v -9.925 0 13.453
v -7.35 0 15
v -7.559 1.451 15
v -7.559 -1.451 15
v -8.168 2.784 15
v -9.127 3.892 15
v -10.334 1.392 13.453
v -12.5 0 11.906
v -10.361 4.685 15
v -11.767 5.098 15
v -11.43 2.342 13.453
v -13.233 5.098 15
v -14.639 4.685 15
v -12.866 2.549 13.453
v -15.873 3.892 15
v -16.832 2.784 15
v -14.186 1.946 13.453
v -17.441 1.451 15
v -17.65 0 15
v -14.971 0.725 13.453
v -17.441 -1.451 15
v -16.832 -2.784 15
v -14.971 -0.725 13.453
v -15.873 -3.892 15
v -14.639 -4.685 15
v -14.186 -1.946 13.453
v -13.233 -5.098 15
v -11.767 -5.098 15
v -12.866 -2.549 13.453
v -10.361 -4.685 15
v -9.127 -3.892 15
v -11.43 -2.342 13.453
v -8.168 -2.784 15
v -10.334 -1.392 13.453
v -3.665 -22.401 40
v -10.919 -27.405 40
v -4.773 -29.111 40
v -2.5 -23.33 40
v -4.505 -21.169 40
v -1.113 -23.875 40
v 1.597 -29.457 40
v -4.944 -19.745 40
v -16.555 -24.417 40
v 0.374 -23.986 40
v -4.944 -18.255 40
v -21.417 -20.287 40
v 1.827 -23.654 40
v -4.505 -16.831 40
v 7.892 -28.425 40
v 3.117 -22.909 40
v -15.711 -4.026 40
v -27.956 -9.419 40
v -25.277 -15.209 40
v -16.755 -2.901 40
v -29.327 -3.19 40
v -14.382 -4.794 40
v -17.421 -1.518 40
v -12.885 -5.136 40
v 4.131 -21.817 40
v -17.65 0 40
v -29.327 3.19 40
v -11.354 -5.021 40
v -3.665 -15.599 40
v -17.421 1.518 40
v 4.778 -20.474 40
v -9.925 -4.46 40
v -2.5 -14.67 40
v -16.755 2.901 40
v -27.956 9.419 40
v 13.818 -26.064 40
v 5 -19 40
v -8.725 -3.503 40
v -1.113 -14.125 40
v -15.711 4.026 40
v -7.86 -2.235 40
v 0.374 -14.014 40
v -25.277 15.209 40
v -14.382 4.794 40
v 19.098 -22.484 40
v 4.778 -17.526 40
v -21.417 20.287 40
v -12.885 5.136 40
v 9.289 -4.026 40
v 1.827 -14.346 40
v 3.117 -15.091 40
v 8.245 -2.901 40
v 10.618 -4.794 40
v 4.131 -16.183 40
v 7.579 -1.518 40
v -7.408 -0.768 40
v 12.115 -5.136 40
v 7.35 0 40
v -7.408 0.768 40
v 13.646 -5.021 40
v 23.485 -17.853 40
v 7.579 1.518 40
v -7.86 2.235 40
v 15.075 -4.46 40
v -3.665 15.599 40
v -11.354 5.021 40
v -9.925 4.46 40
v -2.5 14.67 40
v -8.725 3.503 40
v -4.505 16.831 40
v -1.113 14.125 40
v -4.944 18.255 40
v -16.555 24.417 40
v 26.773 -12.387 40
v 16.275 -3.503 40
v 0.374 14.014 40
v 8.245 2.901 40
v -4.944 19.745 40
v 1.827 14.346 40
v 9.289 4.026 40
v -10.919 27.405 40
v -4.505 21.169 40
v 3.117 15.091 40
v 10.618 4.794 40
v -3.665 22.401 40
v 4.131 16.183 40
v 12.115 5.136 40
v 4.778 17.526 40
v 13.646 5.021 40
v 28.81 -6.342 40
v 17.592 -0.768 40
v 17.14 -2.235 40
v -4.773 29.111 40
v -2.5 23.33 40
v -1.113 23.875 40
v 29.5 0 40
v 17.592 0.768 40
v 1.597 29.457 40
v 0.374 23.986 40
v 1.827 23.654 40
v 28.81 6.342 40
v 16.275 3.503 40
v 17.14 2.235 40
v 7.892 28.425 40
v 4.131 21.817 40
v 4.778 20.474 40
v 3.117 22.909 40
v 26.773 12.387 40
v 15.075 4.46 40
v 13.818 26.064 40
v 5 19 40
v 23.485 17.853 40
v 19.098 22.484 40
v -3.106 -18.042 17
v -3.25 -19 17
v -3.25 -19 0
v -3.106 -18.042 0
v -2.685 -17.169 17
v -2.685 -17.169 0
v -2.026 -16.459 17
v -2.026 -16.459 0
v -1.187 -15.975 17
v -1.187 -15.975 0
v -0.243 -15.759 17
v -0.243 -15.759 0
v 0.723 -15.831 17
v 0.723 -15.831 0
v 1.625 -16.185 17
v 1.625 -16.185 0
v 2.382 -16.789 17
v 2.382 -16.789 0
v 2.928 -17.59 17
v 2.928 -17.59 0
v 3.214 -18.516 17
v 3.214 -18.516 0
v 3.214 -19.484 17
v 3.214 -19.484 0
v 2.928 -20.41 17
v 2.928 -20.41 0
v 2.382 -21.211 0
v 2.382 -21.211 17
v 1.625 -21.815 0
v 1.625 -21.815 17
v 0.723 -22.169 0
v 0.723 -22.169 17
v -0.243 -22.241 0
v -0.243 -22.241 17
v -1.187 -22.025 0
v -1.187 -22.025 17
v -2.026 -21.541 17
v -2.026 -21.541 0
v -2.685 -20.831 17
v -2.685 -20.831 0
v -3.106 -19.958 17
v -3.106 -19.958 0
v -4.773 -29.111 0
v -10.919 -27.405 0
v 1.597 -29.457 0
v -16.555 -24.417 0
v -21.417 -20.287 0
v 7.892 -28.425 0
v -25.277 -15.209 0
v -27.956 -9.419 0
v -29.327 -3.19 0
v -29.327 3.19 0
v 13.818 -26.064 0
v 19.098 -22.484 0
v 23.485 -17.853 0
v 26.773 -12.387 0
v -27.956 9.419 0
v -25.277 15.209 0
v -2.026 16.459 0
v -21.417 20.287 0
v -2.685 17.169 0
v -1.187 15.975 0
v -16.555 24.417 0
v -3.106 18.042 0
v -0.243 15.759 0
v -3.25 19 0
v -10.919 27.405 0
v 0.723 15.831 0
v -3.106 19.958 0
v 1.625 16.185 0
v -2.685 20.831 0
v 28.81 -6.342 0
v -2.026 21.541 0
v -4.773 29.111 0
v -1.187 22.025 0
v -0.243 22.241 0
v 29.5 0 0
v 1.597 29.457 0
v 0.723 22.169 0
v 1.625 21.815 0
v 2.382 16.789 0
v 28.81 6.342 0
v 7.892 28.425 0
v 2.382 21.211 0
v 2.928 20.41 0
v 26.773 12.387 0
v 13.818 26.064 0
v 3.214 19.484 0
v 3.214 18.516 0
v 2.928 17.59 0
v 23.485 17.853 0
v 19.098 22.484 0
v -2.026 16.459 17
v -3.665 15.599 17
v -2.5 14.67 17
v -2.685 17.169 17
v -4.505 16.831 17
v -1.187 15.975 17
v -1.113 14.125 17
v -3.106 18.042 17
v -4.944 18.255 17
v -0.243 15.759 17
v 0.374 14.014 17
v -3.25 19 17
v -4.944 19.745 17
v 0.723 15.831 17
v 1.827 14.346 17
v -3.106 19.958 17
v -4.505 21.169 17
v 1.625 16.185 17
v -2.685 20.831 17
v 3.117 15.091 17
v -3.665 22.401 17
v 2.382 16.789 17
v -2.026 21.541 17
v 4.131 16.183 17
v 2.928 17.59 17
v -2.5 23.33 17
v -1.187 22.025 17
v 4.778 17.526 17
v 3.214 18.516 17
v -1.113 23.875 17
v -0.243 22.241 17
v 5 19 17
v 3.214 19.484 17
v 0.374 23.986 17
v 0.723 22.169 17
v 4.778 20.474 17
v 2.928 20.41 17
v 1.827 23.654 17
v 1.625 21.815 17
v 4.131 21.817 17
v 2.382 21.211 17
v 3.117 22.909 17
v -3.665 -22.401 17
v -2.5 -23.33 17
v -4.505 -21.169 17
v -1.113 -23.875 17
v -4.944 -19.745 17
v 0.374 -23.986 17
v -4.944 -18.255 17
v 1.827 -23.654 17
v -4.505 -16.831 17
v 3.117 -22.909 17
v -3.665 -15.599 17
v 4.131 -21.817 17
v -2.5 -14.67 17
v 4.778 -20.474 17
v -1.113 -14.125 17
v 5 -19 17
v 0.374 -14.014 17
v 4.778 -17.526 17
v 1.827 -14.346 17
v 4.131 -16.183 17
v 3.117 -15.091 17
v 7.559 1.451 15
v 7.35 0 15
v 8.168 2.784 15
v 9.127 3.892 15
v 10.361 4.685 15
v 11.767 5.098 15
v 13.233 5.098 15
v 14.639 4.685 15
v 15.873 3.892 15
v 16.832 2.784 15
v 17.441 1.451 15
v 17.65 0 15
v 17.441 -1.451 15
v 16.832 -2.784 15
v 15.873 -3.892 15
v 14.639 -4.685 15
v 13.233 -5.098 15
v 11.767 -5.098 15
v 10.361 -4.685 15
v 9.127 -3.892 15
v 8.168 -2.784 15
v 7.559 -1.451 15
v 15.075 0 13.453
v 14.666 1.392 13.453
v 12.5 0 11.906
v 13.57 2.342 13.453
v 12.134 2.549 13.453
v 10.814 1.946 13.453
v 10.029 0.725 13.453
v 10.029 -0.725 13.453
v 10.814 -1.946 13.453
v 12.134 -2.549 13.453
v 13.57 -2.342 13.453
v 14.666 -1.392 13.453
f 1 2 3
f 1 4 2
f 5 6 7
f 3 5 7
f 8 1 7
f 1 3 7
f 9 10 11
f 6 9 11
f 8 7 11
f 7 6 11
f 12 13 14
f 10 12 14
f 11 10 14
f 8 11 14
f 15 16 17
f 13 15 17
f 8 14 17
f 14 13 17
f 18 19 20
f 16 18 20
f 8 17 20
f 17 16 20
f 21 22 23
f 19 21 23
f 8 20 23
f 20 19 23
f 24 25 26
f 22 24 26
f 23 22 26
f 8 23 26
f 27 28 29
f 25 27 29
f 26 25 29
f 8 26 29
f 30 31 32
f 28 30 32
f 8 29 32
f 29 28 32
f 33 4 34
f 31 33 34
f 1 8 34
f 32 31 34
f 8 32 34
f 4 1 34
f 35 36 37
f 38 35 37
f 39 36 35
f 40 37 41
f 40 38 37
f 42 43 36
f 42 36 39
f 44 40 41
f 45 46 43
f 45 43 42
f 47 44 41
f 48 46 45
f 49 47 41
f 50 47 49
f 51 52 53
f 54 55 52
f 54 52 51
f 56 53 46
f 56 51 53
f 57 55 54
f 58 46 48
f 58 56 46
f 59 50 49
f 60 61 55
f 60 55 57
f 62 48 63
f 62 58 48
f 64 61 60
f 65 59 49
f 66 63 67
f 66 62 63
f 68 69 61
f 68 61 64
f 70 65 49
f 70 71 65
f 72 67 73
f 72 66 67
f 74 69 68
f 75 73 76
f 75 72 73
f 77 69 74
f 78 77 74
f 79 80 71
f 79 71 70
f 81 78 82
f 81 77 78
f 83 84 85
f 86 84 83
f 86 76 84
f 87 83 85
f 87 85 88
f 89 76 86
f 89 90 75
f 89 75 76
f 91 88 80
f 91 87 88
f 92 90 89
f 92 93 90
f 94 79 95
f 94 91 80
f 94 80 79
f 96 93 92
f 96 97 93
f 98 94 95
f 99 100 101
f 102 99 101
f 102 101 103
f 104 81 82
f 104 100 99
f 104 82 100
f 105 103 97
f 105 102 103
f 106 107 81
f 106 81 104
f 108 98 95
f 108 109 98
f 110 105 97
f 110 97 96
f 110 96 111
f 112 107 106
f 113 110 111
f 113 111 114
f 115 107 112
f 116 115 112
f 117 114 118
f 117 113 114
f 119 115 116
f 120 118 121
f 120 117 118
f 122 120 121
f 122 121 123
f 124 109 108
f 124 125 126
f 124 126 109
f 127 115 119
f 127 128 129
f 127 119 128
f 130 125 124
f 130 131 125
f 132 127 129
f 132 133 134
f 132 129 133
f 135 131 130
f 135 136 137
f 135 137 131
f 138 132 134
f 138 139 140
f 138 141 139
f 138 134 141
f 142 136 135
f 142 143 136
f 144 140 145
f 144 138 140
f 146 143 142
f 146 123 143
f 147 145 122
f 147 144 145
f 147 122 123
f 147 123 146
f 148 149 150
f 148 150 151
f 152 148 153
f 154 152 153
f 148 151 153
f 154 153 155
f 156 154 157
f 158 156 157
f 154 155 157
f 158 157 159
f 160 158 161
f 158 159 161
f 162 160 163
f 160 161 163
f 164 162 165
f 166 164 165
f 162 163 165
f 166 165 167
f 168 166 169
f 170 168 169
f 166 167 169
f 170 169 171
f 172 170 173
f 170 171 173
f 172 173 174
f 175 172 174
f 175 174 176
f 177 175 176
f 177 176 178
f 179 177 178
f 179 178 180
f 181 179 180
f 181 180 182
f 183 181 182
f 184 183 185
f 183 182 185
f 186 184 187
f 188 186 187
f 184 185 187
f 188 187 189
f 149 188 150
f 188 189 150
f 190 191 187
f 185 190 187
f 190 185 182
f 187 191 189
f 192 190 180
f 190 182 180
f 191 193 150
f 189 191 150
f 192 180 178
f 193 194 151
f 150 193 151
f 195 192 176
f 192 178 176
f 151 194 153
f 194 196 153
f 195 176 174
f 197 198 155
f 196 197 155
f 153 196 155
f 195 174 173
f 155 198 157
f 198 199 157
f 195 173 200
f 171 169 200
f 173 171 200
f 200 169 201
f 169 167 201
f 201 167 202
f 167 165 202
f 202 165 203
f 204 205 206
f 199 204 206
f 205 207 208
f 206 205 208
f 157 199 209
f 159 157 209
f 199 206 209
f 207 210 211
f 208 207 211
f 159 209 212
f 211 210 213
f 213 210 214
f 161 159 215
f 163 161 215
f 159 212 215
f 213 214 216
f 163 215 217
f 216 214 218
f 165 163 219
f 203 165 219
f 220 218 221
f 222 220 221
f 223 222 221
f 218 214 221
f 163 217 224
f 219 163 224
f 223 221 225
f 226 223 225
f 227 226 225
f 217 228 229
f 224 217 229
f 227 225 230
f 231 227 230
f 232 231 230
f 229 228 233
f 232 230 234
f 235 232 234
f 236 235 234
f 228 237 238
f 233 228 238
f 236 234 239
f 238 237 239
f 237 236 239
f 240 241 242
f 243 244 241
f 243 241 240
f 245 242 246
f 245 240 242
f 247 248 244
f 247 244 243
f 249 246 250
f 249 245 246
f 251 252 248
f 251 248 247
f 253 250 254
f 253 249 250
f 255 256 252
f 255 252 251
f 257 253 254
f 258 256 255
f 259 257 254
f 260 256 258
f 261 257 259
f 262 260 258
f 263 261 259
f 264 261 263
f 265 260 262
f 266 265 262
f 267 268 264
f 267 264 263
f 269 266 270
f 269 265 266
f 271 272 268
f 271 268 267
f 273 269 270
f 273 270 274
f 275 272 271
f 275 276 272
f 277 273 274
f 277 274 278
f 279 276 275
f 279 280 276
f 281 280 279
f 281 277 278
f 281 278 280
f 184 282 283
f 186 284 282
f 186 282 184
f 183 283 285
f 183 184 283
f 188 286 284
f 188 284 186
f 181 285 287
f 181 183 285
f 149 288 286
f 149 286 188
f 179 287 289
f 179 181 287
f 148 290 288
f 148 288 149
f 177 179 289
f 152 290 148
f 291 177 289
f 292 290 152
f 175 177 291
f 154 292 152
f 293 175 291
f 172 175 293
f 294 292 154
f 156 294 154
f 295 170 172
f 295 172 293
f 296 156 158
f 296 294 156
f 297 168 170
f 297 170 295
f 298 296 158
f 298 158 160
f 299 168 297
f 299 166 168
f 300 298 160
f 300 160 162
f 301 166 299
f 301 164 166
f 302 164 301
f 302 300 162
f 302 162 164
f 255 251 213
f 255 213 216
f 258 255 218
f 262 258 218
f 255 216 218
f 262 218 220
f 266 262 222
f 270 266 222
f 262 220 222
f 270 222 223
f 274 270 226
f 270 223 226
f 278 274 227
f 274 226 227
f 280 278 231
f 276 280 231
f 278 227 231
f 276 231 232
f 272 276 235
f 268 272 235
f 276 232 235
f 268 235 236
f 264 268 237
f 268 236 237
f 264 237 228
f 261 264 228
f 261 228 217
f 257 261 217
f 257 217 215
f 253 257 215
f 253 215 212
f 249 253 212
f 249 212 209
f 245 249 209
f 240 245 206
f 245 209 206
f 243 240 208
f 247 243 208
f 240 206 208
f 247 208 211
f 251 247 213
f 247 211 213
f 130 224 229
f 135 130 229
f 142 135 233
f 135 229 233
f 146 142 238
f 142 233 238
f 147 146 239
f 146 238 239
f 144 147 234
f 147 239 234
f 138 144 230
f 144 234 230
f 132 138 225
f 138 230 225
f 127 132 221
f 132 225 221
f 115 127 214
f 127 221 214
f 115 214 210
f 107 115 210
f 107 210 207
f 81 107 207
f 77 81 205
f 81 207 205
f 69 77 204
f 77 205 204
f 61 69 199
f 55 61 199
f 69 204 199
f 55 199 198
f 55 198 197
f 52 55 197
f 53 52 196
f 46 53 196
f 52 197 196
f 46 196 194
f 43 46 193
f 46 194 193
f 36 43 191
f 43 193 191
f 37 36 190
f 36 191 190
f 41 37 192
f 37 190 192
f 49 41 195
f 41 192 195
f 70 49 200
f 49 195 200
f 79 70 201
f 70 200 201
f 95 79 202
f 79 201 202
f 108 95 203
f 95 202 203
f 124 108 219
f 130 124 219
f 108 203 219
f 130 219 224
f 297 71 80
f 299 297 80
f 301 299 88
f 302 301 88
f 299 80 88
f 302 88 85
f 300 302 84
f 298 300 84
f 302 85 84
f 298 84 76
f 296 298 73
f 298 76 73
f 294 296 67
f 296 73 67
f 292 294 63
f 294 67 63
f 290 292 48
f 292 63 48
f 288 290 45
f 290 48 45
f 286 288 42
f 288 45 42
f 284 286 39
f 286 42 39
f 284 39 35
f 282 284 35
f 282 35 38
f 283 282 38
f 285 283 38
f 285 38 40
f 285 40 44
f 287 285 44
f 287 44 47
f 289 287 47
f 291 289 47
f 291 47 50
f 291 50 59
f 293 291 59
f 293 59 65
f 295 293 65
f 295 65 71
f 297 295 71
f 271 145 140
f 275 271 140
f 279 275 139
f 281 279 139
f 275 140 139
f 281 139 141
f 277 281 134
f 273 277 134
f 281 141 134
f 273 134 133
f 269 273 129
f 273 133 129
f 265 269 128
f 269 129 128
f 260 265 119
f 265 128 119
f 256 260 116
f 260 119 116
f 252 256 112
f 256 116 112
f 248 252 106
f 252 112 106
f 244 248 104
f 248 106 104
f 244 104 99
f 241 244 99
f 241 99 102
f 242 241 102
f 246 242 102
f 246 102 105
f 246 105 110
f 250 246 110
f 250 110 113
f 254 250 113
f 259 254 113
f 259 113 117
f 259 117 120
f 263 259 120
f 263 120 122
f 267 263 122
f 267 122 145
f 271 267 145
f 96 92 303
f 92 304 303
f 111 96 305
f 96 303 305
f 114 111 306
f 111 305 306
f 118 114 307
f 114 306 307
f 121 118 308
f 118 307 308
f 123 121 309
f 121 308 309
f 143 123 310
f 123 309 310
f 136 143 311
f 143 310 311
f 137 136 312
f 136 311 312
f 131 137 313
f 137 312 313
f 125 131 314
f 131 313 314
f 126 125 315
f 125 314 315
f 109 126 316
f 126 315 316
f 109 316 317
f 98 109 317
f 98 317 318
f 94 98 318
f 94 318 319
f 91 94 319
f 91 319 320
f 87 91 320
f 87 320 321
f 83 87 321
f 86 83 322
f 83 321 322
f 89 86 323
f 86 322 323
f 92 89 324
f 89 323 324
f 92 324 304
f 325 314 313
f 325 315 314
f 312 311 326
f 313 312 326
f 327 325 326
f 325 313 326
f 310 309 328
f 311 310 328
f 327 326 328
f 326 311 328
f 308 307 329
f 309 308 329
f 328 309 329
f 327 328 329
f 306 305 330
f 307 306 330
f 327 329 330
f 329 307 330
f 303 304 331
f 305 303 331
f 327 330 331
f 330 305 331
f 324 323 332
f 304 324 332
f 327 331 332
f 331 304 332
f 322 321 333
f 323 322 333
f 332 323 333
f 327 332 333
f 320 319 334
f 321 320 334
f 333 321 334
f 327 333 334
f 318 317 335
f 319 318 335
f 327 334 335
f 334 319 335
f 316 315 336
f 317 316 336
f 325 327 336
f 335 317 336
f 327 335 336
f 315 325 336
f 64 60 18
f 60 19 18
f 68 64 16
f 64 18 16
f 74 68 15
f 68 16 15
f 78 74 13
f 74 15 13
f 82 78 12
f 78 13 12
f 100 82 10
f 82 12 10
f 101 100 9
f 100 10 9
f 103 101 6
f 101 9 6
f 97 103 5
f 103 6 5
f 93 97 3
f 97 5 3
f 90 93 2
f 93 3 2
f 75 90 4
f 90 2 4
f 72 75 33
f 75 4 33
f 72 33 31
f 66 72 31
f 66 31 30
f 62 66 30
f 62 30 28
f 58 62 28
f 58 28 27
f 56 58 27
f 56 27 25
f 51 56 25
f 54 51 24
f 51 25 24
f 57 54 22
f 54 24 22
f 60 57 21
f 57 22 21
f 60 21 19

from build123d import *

# Parameters (mm, degrees)
F0_R           = 29.5
F1_DEPTH       = 40
F3_D           = 10.3
F3_DEPTH       = 25
F3_TIP         = 3.094432188
F5_D           = 6.5
F5_CBORE_D     = 10
F5_CBORE_DEPTH = 23


with BuildPart() as f1:
    # F0 (on Top) → F1 (new body)
    with BuildSketch(Plane.XY):
        Circle(F0_R)
    extrude(amount=F1_DEPTH)

    # F3
    with Locations(Plane.XY.offset(40)):
        with Locations((-12.5, 0), (12.5, 0)):
            Hole(F3_D / 2, depth=F3_DEPTH)
            with Locations((0, 0, -(F3_DEPTH + F3_TIP / 2))):  # 118° drill point
                Cone(0, F3_D / 2, F3_TIP, mode=Mode.SUBTRACT)

    # F5 (through all)
    with Locations(Plane.XY.offset(40)):
        with Locations((0, 19), (0, -19)):
            CounterBoreHole(F5_D / 2, F5_CBORE_D / 2, F5_CBORE_DEPTH)


solid = f1.part
